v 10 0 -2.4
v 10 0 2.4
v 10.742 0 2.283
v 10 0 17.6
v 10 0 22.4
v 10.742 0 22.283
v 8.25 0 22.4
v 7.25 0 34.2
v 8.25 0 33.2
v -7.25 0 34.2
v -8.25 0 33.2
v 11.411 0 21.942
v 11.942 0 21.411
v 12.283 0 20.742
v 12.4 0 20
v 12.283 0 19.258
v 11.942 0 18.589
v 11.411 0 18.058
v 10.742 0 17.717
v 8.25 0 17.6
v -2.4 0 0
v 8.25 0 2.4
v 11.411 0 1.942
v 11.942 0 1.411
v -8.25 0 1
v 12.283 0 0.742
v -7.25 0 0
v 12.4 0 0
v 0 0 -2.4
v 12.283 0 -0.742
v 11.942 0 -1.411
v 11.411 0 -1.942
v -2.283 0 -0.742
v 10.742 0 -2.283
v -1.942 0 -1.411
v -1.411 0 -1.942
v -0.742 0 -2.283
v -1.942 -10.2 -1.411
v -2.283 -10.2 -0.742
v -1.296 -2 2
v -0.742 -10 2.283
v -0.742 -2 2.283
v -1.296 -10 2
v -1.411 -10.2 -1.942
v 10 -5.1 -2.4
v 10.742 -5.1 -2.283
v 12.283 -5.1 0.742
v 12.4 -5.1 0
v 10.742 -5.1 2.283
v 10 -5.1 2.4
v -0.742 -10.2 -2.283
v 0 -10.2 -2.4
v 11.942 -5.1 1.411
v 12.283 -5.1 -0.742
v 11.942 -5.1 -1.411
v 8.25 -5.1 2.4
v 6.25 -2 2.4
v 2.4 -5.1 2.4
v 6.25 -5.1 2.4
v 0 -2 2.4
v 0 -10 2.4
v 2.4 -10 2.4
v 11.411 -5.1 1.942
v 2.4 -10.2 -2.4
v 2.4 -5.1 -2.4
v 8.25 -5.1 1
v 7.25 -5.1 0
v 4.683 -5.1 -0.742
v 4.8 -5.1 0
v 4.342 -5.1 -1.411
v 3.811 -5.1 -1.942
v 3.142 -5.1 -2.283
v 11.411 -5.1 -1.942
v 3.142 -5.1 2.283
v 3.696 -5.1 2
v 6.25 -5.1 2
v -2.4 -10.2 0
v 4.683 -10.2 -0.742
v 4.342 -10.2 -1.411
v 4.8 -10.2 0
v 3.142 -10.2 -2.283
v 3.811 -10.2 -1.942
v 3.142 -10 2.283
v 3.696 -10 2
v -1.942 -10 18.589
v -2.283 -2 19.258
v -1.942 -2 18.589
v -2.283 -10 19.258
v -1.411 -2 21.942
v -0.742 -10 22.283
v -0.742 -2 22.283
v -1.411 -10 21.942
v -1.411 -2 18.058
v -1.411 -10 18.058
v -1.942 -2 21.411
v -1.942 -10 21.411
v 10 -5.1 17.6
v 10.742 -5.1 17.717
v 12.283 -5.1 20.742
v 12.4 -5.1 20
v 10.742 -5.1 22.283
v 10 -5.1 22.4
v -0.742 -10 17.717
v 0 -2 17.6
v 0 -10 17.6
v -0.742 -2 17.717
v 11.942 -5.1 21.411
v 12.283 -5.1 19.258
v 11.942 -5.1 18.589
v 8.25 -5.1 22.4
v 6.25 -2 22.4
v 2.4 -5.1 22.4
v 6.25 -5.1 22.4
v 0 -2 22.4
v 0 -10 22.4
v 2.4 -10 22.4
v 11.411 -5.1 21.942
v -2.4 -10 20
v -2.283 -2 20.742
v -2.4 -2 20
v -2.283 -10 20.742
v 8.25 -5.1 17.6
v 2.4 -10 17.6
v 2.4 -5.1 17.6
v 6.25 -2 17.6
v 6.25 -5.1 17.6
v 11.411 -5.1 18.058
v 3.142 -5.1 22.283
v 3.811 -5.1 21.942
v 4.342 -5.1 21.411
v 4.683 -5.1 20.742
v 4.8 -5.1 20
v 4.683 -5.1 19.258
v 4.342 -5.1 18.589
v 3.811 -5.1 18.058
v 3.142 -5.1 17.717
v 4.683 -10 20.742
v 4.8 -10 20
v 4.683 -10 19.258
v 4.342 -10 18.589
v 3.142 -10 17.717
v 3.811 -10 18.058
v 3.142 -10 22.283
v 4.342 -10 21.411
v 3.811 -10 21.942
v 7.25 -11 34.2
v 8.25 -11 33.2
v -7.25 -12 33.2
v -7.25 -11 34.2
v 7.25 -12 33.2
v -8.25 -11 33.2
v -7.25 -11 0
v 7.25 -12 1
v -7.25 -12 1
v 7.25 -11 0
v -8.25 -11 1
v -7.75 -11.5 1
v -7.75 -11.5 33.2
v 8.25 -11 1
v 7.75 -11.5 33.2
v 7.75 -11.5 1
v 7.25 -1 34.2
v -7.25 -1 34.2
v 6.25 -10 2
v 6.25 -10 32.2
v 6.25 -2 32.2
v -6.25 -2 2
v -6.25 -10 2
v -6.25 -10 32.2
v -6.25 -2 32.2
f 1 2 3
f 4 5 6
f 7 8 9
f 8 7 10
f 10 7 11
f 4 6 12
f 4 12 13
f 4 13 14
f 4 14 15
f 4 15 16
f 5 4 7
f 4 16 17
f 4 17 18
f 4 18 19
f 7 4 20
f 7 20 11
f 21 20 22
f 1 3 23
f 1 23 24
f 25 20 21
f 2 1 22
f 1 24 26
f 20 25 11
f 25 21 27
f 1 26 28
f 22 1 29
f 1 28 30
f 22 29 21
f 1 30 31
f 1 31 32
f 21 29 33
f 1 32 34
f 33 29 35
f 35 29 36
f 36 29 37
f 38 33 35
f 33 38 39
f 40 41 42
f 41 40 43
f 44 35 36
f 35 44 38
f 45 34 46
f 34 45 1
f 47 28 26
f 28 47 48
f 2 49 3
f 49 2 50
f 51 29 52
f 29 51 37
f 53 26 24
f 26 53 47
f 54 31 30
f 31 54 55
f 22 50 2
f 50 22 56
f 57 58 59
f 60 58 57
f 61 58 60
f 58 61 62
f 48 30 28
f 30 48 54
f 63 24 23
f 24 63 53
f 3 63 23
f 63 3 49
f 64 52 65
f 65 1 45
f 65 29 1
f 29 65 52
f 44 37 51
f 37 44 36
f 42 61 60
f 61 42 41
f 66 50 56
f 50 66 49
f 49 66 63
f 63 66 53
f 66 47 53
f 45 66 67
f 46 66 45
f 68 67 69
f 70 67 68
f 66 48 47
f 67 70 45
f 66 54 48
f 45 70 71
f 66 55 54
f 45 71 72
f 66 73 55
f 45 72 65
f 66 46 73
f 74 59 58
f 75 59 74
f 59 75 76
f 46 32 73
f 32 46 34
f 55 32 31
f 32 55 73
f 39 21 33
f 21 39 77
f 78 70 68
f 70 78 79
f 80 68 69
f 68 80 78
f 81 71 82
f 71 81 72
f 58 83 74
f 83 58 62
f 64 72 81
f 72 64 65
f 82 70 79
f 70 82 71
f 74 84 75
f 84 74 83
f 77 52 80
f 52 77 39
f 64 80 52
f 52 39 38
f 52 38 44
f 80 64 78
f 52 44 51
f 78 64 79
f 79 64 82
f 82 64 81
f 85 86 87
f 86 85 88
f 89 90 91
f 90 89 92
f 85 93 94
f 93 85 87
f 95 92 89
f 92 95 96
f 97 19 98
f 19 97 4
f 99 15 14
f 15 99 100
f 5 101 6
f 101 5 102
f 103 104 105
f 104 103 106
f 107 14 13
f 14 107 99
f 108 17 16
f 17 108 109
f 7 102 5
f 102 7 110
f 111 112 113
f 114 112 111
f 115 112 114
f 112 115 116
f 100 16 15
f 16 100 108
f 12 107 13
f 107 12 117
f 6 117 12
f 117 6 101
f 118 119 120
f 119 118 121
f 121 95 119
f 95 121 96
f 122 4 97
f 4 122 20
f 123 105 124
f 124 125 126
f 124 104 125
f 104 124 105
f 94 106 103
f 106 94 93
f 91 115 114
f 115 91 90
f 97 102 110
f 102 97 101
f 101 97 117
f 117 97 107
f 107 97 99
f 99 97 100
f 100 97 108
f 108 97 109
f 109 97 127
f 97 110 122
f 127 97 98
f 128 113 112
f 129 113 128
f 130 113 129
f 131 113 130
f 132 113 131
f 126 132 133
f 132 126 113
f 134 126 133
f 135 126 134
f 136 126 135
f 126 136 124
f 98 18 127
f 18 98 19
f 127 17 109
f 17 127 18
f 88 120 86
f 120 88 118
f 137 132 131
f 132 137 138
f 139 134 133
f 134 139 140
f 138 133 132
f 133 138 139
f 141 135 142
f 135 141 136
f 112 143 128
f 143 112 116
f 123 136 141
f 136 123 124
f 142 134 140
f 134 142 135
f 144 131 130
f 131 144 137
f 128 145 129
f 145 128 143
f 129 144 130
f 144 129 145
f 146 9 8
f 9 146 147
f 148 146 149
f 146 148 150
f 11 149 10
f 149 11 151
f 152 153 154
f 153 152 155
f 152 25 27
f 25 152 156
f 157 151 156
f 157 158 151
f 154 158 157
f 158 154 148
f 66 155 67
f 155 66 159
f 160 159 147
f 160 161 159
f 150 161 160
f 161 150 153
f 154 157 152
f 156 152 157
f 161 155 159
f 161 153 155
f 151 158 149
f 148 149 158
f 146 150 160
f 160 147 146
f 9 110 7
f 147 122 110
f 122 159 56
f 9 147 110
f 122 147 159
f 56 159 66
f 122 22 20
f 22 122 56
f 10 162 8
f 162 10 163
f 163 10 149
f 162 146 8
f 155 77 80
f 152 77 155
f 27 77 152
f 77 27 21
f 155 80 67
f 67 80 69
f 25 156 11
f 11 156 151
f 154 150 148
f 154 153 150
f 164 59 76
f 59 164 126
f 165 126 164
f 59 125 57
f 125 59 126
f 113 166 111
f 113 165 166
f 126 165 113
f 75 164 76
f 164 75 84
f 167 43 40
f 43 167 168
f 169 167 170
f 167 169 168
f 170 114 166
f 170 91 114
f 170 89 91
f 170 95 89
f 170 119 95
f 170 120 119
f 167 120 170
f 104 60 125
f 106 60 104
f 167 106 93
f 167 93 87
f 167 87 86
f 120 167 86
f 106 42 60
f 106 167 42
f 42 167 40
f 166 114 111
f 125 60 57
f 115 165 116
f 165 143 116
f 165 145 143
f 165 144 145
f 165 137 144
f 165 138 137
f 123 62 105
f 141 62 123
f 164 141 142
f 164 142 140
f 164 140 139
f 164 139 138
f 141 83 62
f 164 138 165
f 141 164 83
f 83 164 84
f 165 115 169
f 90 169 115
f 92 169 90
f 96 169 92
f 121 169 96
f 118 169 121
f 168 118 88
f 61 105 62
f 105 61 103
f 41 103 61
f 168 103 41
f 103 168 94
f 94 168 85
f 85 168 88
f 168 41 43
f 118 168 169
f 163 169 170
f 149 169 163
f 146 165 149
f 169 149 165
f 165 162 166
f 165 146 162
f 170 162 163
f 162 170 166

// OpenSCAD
include <BOSL/constants.scad>
use <BOSL/transforms.scad>
use <BOSL/shapes.scad>
include <jb-scad/skadis.scad>

a=12.5;
b=8;
c=SKADIS_HOLES_SPACING_X+SKADIS_HOOK_HEIGHT+2;

module skadis_hooks() {
    xrot(90) {
        skadis_hook_single();
        ymove(SKADIS_HOLES_SPACING_X) skadis_hook_single();
    }
}

skadis_hooks();
difference() {
    cuboid([ a+4, b+4, c+2], align=V_FRONT+V_TOP, chamfer=1, edges=EDGES_ALL-EDGES_BACK);
    move(y=-2, z=2) cuboid([ a, b, c], align=V_FRONT+V_TOP);
    hull() {
        move(y=-2, z=c) cuboid([ a, b, 1], align=V_FRONT+V_TOP);
        move(y=-1, z=c+2) cuboid([ a+2, b+2, 1], align=V_FRONT+V_TOP);
    }
}
